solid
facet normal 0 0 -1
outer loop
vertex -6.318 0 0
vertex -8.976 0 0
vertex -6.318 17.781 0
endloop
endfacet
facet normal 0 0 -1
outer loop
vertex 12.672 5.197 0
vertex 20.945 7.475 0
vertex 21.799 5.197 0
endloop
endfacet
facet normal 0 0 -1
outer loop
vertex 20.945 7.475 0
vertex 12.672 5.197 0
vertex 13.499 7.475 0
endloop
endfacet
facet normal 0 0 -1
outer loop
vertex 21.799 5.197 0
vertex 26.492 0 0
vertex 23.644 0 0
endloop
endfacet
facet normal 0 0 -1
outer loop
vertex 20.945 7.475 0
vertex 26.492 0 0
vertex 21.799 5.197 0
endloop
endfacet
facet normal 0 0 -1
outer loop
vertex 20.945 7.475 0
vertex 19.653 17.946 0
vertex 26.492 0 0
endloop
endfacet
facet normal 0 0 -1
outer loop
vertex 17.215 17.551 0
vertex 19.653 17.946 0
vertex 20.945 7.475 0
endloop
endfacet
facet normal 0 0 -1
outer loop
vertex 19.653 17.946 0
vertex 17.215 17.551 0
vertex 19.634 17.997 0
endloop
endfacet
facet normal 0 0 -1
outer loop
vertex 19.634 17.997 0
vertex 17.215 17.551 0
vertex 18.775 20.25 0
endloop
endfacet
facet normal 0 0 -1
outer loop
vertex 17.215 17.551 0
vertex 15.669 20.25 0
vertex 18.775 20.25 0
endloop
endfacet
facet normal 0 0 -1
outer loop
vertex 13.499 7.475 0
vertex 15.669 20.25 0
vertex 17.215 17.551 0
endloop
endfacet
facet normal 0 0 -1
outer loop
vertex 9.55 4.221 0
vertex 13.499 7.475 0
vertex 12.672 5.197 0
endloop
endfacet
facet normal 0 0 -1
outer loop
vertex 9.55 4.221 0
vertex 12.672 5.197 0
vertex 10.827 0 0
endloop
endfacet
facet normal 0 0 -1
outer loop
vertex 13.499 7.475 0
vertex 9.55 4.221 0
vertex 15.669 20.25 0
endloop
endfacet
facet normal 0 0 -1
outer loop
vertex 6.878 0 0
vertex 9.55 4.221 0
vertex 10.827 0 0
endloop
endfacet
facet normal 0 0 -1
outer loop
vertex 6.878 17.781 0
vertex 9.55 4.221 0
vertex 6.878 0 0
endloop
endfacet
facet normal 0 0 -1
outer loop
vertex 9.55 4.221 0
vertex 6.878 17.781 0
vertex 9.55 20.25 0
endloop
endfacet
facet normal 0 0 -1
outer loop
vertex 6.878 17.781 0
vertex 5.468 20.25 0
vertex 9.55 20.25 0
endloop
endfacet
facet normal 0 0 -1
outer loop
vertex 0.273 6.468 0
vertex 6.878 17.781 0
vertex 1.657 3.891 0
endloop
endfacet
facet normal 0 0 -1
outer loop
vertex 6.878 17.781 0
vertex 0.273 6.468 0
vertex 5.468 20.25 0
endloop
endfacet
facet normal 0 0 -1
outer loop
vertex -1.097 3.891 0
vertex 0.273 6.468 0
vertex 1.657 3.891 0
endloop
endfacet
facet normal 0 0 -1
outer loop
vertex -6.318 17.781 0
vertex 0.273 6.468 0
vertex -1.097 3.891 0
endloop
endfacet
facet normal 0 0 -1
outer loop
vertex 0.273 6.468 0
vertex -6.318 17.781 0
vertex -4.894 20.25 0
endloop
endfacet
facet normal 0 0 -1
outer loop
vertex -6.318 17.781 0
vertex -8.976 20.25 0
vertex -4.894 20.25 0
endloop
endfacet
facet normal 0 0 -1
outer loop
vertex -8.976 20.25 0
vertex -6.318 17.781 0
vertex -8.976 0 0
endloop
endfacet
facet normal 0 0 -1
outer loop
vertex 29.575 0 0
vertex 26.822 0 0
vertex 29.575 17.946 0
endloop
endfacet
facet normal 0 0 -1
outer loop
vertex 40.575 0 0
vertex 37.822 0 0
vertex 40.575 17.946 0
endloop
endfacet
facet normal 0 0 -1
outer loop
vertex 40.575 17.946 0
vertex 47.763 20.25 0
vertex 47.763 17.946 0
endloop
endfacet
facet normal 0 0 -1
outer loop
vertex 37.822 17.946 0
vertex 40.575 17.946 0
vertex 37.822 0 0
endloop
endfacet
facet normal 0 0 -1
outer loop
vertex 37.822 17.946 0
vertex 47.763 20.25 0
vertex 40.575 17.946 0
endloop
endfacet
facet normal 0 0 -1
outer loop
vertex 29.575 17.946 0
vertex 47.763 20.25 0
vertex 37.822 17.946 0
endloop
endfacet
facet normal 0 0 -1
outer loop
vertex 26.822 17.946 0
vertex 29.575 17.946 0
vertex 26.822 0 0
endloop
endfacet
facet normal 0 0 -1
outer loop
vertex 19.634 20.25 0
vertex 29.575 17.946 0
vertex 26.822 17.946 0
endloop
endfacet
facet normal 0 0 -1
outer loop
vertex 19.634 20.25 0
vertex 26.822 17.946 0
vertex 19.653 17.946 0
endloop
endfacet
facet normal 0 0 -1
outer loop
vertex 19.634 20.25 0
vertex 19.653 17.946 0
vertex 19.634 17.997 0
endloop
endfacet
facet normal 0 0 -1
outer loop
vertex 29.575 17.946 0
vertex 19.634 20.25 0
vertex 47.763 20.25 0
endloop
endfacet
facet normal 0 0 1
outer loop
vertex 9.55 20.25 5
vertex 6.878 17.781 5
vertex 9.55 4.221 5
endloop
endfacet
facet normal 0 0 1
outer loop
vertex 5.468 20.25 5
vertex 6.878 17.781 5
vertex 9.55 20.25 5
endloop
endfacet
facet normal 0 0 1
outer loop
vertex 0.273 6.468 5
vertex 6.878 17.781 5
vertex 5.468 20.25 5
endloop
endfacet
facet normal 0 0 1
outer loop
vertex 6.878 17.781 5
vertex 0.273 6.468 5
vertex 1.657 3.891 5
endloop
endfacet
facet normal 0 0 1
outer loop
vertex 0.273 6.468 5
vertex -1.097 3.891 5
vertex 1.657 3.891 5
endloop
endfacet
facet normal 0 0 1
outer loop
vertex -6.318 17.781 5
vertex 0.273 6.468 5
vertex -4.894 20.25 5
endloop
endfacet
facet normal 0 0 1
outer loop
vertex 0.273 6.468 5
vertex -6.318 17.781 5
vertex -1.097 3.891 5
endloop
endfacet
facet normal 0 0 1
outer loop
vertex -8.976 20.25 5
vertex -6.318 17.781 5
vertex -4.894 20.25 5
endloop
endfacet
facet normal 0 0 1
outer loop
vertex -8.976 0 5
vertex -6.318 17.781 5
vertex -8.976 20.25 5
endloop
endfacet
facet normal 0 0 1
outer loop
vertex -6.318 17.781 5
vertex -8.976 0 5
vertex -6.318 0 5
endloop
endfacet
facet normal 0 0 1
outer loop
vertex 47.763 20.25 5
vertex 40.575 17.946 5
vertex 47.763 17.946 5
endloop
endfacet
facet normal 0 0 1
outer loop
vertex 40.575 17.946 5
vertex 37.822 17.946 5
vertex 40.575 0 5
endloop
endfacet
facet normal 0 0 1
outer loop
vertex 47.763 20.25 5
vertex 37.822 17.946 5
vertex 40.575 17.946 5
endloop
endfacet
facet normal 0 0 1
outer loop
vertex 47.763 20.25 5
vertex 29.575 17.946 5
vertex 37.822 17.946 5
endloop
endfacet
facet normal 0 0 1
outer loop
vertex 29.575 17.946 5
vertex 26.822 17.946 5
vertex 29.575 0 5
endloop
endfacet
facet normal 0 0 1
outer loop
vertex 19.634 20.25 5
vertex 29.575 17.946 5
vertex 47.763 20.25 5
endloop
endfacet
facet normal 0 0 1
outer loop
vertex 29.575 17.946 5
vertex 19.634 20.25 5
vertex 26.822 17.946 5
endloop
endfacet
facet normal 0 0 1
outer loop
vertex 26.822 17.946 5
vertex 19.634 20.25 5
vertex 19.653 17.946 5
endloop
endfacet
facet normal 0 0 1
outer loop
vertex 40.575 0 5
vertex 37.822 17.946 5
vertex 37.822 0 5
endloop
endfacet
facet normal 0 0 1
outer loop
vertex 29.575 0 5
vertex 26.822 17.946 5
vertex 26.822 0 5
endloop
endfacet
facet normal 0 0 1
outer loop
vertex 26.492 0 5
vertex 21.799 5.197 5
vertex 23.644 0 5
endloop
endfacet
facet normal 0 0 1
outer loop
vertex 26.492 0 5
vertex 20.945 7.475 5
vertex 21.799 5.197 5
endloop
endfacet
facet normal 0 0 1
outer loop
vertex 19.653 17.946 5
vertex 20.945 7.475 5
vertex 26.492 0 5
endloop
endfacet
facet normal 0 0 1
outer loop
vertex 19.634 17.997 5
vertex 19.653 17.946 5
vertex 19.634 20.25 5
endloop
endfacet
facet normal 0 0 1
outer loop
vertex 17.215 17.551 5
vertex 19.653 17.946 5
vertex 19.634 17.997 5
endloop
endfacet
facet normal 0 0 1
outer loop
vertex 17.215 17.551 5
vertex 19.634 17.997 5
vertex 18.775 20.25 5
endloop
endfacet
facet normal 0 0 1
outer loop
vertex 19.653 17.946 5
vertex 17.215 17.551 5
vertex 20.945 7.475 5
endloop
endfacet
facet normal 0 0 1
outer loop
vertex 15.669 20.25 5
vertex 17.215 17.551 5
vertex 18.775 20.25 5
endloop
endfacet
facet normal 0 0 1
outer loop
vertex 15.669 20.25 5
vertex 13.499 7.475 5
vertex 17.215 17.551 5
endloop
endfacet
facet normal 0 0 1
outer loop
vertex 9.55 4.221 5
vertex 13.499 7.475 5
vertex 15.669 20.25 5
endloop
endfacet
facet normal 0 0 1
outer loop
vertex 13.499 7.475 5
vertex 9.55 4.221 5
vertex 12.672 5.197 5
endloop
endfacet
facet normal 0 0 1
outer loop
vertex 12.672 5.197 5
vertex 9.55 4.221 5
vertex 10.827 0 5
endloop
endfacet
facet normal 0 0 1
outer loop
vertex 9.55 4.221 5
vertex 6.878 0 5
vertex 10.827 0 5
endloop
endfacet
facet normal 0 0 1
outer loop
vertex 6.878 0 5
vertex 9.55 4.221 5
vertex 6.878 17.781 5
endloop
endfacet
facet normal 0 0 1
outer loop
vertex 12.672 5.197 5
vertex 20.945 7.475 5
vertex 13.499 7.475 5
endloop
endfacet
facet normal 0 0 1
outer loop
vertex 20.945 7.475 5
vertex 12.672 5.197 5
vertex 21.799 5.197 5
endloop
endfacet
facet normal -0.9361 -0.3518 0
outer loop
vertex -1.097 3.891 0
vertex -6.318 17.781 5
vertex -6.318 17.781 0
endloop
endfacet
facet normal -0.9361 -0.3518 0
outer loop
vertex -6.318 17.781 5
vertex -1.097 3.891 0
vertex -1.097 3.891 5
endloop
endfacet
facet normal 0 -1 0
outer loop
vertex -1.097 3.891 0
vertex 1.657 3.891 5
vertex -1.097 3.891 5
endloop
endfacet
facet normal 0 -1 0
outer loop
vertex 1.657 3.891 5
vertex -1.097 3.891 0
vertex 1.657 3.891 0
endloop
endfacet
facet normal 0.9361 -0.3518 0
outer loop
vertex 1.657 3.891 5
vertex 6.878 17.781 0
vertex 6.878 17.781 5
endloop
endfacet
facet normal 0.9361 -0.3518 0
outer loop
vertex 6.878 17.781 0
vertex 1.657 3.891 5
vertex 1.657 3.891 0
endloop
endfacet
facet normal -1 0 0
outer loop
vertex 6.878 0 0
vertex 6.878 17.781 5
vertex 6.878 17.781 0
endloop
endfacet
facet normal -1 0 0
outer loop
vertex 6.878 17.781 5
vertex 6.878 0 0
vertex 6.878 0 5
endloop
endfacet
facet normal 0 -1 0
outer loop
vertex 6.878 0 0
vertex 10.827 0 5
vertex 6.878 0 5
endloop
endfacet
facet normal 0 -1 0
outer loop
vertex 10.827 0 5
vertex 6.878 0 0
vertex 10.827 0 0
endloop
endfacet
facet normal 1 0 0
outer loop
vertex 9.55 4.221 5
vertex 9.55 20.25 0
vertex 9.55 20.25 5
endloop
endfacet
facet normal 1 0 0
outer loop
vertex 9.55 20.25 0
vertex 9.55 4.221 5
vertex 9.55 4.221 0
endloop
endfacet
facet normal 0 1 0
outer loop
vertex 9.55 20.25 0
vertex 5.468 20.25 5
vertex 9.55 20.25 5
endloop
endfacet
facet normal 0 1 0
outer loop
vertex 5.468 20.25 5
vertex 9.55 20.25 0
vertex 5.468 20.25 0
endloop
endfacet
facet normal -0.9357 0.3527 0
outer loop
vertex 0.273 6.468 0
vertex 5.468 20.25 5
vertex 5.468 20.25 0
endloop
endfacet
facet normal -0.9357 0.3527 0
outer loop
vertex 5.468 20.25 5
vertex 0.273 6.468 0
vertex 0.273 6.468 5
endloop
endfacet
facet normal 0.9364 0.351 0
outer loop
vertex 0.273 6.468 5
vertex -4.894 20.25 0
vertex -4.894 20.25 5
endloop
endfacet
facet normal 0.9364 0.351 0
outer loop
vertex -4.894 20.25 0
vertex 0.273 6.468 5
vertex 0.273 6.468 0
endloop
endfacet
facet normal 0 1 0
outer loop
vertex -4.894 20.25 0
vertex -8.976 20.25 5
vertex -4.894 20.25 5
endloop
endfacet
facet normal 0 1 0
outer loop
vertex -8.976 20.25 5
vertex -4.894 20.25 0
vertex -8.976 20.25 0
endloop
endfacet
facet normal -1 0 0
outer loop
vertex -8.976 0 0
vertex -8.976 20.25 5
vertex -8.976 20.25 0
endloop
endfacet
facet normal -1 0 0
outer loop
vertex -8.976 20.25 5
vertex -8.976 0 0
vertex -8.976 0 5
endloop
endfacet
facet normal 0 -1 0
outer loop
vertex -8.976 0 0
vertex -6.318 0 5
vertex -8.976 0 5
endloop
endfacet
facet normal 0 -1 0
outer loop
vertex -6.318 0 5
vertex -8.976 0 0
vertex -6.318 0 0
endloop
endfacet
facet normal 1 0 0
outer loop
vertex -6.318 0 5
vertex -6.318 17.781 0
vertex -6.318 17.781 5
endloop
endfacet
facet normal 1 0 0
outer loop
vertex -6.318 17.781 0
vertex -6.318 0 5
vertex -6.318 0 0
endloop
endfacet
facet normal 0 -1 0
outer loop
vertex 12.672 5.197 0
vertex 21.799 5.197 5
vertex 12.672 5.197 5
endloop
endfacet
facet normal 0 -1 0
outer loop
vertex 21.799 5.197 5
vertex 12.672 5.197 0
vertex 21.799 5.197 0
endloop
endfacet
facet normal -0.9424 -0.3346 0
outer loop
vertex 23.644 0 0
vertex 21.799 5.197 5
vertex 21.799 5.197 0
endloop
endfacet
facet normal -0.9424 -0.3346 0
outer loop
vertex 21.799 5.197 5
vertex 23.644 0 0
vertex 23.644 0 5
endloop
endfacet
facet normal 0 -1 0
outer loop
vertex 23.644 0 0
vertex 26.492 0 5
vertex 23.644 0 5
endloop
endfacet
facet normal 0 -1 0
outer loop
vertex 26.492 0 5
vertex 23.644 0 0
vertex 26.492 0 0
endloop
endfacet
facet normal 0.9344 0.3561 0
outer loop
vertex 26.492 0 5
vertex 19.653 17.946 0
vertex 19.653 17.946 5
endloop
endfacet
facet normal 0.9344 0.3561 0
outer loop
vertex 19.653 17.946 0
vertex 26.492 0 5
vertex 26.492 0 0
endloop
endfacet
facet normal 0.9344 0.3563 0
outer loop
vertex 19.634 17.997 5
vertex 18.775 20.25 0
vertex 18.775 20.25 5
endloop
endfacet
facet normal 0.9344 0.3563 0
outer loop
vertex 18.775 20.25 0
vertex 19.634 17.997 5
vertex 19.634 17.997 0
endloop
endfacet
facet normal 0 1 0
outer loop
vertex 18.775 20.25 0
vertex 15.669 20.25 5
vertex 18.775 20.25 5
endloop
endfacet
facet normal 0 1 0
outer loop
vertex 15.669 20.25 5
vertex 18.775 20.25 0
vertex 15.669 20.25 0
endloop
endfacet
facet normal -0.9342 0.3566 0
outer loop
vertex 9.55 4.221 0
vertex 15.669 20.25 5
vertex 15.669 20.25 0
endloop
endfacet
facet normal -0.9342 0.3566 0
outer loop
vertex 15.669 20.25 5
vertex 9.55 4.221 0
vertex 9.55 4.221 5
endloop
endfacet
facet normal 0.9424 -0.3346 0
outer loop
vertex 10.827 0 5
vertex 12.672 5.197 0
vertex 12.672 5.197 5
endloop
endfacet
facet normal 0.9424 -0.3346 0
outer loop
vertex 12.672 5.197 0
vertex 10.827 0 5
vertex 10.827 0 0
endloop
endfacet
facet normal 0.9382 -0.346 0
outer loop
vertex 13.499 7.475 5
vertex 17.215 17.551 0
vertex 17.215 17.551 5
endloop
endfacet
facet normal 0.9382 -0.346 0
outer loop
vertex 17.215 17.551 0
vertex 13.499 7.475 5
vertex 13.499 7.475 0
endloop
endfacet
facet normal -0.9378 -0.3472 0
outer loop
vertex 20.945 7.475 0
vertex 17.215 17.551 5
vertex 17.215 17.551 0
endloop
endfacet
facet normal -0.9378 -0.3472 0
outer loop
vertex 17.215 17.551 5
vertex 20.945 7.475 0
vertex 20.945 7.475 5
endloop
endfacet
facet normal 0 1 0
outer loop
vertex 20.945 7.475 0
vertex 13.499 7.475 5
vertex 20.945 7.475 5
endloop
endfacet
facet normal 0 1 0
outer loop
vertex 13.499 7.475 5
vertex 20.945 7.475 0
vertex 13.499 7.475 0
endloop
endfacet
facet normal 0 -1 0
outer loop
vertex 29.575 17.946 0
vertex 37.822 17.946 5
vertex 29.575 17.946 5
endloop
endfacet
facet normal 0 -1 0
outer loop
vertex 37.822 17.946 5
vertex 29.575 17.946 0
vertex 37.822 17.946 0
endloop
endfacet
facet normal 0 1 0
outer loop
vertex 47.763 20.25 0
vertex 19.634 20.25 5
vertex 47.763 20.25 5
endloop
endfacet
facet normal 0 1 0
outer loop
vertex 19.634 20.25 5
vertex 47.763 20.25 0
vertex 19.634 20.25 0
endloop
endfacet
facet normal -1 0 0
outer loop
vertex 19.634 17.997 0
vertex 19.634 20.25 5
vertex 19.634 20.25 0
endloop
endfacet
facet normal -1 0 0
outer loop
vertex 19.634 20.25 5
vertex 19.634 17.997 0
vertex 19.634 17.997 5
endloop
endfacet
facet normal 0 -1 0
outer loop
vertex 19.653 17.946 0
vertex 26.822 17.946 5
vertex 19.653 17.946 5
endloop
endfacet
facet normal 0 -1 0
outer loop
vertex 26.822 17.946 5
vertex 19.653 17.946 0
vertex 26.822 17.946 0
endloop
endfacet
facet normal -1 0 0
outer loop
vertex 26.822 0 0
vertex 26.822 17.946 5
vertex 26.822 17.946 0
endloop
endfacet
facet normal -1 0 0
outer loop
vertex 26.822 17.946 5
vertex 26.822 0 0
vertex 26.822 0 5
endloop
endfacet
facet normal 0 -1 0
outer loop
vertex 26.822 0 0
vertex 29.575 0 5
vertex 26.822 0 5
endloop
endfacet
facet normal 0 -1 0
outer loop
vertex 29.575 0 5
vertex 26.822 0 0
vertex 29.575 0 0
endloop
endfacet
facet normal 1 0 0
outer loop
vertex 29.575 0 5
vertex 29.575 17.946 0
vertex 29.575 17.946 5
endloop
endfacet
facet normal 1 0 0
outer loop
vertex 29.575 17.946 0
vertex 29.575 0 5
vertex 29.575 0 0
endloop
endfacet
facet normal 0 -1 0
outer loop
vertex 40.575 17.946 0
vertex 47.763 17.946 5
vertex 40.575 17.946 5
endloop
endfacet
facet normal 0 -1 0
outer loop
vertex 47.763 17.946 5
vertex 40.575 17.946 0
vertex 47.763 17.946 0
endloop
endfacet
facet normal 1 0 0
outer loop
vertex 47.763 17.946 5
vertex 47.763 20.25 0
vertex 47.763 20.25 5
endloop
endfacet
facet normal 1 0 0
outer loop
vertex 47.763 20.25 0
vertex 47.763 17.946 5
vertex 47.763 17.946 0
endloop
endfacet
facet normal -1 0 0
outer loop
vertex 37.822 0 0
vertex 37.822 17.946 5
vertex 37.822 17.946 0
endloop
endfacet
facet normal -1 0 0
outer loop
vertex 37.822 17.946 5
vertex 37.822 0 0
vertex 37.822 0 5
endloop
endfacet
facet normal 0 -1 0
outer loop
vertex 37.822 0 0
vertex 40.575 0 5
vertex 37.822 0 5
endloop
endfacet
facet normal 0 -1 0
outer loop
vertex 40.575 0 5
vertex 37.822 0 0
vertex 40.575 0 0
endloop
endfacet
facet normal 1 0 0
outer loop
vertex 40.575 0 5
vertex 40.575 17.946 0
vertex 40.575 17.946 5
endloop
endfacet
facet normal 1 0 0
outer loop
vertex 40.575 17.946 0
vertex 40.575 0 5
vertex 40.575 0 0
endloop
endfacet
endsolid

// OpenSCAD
$fs=0.8; // def 1, 0.2 is high res
$fa=4;//def 12, 3 is very nice
%translate([0,0,-0.5])cube([200,200,1],center=true); //build platform

h = 5;
fontsize = 20;

translate([0,0,0]) linear_extrude(height=h) 
	text("M", font = "Racing Sans One", size = fontsize, halign = "center");

translate([17,0,0]) linear_extrude(height=h) 
	text("A", font = "Racing Sans One", size = fontsize, halign = "center");

translate([28,0,0]) linear_extrude(height=h) 
	text("T", font = "Racing Sans One", size = fontsize, halign = "center");

translate([39,0,0]) linear_extrude(height=h) 
	text("T", font = "Racing Sans One", size = fontsize, halign = "center");
